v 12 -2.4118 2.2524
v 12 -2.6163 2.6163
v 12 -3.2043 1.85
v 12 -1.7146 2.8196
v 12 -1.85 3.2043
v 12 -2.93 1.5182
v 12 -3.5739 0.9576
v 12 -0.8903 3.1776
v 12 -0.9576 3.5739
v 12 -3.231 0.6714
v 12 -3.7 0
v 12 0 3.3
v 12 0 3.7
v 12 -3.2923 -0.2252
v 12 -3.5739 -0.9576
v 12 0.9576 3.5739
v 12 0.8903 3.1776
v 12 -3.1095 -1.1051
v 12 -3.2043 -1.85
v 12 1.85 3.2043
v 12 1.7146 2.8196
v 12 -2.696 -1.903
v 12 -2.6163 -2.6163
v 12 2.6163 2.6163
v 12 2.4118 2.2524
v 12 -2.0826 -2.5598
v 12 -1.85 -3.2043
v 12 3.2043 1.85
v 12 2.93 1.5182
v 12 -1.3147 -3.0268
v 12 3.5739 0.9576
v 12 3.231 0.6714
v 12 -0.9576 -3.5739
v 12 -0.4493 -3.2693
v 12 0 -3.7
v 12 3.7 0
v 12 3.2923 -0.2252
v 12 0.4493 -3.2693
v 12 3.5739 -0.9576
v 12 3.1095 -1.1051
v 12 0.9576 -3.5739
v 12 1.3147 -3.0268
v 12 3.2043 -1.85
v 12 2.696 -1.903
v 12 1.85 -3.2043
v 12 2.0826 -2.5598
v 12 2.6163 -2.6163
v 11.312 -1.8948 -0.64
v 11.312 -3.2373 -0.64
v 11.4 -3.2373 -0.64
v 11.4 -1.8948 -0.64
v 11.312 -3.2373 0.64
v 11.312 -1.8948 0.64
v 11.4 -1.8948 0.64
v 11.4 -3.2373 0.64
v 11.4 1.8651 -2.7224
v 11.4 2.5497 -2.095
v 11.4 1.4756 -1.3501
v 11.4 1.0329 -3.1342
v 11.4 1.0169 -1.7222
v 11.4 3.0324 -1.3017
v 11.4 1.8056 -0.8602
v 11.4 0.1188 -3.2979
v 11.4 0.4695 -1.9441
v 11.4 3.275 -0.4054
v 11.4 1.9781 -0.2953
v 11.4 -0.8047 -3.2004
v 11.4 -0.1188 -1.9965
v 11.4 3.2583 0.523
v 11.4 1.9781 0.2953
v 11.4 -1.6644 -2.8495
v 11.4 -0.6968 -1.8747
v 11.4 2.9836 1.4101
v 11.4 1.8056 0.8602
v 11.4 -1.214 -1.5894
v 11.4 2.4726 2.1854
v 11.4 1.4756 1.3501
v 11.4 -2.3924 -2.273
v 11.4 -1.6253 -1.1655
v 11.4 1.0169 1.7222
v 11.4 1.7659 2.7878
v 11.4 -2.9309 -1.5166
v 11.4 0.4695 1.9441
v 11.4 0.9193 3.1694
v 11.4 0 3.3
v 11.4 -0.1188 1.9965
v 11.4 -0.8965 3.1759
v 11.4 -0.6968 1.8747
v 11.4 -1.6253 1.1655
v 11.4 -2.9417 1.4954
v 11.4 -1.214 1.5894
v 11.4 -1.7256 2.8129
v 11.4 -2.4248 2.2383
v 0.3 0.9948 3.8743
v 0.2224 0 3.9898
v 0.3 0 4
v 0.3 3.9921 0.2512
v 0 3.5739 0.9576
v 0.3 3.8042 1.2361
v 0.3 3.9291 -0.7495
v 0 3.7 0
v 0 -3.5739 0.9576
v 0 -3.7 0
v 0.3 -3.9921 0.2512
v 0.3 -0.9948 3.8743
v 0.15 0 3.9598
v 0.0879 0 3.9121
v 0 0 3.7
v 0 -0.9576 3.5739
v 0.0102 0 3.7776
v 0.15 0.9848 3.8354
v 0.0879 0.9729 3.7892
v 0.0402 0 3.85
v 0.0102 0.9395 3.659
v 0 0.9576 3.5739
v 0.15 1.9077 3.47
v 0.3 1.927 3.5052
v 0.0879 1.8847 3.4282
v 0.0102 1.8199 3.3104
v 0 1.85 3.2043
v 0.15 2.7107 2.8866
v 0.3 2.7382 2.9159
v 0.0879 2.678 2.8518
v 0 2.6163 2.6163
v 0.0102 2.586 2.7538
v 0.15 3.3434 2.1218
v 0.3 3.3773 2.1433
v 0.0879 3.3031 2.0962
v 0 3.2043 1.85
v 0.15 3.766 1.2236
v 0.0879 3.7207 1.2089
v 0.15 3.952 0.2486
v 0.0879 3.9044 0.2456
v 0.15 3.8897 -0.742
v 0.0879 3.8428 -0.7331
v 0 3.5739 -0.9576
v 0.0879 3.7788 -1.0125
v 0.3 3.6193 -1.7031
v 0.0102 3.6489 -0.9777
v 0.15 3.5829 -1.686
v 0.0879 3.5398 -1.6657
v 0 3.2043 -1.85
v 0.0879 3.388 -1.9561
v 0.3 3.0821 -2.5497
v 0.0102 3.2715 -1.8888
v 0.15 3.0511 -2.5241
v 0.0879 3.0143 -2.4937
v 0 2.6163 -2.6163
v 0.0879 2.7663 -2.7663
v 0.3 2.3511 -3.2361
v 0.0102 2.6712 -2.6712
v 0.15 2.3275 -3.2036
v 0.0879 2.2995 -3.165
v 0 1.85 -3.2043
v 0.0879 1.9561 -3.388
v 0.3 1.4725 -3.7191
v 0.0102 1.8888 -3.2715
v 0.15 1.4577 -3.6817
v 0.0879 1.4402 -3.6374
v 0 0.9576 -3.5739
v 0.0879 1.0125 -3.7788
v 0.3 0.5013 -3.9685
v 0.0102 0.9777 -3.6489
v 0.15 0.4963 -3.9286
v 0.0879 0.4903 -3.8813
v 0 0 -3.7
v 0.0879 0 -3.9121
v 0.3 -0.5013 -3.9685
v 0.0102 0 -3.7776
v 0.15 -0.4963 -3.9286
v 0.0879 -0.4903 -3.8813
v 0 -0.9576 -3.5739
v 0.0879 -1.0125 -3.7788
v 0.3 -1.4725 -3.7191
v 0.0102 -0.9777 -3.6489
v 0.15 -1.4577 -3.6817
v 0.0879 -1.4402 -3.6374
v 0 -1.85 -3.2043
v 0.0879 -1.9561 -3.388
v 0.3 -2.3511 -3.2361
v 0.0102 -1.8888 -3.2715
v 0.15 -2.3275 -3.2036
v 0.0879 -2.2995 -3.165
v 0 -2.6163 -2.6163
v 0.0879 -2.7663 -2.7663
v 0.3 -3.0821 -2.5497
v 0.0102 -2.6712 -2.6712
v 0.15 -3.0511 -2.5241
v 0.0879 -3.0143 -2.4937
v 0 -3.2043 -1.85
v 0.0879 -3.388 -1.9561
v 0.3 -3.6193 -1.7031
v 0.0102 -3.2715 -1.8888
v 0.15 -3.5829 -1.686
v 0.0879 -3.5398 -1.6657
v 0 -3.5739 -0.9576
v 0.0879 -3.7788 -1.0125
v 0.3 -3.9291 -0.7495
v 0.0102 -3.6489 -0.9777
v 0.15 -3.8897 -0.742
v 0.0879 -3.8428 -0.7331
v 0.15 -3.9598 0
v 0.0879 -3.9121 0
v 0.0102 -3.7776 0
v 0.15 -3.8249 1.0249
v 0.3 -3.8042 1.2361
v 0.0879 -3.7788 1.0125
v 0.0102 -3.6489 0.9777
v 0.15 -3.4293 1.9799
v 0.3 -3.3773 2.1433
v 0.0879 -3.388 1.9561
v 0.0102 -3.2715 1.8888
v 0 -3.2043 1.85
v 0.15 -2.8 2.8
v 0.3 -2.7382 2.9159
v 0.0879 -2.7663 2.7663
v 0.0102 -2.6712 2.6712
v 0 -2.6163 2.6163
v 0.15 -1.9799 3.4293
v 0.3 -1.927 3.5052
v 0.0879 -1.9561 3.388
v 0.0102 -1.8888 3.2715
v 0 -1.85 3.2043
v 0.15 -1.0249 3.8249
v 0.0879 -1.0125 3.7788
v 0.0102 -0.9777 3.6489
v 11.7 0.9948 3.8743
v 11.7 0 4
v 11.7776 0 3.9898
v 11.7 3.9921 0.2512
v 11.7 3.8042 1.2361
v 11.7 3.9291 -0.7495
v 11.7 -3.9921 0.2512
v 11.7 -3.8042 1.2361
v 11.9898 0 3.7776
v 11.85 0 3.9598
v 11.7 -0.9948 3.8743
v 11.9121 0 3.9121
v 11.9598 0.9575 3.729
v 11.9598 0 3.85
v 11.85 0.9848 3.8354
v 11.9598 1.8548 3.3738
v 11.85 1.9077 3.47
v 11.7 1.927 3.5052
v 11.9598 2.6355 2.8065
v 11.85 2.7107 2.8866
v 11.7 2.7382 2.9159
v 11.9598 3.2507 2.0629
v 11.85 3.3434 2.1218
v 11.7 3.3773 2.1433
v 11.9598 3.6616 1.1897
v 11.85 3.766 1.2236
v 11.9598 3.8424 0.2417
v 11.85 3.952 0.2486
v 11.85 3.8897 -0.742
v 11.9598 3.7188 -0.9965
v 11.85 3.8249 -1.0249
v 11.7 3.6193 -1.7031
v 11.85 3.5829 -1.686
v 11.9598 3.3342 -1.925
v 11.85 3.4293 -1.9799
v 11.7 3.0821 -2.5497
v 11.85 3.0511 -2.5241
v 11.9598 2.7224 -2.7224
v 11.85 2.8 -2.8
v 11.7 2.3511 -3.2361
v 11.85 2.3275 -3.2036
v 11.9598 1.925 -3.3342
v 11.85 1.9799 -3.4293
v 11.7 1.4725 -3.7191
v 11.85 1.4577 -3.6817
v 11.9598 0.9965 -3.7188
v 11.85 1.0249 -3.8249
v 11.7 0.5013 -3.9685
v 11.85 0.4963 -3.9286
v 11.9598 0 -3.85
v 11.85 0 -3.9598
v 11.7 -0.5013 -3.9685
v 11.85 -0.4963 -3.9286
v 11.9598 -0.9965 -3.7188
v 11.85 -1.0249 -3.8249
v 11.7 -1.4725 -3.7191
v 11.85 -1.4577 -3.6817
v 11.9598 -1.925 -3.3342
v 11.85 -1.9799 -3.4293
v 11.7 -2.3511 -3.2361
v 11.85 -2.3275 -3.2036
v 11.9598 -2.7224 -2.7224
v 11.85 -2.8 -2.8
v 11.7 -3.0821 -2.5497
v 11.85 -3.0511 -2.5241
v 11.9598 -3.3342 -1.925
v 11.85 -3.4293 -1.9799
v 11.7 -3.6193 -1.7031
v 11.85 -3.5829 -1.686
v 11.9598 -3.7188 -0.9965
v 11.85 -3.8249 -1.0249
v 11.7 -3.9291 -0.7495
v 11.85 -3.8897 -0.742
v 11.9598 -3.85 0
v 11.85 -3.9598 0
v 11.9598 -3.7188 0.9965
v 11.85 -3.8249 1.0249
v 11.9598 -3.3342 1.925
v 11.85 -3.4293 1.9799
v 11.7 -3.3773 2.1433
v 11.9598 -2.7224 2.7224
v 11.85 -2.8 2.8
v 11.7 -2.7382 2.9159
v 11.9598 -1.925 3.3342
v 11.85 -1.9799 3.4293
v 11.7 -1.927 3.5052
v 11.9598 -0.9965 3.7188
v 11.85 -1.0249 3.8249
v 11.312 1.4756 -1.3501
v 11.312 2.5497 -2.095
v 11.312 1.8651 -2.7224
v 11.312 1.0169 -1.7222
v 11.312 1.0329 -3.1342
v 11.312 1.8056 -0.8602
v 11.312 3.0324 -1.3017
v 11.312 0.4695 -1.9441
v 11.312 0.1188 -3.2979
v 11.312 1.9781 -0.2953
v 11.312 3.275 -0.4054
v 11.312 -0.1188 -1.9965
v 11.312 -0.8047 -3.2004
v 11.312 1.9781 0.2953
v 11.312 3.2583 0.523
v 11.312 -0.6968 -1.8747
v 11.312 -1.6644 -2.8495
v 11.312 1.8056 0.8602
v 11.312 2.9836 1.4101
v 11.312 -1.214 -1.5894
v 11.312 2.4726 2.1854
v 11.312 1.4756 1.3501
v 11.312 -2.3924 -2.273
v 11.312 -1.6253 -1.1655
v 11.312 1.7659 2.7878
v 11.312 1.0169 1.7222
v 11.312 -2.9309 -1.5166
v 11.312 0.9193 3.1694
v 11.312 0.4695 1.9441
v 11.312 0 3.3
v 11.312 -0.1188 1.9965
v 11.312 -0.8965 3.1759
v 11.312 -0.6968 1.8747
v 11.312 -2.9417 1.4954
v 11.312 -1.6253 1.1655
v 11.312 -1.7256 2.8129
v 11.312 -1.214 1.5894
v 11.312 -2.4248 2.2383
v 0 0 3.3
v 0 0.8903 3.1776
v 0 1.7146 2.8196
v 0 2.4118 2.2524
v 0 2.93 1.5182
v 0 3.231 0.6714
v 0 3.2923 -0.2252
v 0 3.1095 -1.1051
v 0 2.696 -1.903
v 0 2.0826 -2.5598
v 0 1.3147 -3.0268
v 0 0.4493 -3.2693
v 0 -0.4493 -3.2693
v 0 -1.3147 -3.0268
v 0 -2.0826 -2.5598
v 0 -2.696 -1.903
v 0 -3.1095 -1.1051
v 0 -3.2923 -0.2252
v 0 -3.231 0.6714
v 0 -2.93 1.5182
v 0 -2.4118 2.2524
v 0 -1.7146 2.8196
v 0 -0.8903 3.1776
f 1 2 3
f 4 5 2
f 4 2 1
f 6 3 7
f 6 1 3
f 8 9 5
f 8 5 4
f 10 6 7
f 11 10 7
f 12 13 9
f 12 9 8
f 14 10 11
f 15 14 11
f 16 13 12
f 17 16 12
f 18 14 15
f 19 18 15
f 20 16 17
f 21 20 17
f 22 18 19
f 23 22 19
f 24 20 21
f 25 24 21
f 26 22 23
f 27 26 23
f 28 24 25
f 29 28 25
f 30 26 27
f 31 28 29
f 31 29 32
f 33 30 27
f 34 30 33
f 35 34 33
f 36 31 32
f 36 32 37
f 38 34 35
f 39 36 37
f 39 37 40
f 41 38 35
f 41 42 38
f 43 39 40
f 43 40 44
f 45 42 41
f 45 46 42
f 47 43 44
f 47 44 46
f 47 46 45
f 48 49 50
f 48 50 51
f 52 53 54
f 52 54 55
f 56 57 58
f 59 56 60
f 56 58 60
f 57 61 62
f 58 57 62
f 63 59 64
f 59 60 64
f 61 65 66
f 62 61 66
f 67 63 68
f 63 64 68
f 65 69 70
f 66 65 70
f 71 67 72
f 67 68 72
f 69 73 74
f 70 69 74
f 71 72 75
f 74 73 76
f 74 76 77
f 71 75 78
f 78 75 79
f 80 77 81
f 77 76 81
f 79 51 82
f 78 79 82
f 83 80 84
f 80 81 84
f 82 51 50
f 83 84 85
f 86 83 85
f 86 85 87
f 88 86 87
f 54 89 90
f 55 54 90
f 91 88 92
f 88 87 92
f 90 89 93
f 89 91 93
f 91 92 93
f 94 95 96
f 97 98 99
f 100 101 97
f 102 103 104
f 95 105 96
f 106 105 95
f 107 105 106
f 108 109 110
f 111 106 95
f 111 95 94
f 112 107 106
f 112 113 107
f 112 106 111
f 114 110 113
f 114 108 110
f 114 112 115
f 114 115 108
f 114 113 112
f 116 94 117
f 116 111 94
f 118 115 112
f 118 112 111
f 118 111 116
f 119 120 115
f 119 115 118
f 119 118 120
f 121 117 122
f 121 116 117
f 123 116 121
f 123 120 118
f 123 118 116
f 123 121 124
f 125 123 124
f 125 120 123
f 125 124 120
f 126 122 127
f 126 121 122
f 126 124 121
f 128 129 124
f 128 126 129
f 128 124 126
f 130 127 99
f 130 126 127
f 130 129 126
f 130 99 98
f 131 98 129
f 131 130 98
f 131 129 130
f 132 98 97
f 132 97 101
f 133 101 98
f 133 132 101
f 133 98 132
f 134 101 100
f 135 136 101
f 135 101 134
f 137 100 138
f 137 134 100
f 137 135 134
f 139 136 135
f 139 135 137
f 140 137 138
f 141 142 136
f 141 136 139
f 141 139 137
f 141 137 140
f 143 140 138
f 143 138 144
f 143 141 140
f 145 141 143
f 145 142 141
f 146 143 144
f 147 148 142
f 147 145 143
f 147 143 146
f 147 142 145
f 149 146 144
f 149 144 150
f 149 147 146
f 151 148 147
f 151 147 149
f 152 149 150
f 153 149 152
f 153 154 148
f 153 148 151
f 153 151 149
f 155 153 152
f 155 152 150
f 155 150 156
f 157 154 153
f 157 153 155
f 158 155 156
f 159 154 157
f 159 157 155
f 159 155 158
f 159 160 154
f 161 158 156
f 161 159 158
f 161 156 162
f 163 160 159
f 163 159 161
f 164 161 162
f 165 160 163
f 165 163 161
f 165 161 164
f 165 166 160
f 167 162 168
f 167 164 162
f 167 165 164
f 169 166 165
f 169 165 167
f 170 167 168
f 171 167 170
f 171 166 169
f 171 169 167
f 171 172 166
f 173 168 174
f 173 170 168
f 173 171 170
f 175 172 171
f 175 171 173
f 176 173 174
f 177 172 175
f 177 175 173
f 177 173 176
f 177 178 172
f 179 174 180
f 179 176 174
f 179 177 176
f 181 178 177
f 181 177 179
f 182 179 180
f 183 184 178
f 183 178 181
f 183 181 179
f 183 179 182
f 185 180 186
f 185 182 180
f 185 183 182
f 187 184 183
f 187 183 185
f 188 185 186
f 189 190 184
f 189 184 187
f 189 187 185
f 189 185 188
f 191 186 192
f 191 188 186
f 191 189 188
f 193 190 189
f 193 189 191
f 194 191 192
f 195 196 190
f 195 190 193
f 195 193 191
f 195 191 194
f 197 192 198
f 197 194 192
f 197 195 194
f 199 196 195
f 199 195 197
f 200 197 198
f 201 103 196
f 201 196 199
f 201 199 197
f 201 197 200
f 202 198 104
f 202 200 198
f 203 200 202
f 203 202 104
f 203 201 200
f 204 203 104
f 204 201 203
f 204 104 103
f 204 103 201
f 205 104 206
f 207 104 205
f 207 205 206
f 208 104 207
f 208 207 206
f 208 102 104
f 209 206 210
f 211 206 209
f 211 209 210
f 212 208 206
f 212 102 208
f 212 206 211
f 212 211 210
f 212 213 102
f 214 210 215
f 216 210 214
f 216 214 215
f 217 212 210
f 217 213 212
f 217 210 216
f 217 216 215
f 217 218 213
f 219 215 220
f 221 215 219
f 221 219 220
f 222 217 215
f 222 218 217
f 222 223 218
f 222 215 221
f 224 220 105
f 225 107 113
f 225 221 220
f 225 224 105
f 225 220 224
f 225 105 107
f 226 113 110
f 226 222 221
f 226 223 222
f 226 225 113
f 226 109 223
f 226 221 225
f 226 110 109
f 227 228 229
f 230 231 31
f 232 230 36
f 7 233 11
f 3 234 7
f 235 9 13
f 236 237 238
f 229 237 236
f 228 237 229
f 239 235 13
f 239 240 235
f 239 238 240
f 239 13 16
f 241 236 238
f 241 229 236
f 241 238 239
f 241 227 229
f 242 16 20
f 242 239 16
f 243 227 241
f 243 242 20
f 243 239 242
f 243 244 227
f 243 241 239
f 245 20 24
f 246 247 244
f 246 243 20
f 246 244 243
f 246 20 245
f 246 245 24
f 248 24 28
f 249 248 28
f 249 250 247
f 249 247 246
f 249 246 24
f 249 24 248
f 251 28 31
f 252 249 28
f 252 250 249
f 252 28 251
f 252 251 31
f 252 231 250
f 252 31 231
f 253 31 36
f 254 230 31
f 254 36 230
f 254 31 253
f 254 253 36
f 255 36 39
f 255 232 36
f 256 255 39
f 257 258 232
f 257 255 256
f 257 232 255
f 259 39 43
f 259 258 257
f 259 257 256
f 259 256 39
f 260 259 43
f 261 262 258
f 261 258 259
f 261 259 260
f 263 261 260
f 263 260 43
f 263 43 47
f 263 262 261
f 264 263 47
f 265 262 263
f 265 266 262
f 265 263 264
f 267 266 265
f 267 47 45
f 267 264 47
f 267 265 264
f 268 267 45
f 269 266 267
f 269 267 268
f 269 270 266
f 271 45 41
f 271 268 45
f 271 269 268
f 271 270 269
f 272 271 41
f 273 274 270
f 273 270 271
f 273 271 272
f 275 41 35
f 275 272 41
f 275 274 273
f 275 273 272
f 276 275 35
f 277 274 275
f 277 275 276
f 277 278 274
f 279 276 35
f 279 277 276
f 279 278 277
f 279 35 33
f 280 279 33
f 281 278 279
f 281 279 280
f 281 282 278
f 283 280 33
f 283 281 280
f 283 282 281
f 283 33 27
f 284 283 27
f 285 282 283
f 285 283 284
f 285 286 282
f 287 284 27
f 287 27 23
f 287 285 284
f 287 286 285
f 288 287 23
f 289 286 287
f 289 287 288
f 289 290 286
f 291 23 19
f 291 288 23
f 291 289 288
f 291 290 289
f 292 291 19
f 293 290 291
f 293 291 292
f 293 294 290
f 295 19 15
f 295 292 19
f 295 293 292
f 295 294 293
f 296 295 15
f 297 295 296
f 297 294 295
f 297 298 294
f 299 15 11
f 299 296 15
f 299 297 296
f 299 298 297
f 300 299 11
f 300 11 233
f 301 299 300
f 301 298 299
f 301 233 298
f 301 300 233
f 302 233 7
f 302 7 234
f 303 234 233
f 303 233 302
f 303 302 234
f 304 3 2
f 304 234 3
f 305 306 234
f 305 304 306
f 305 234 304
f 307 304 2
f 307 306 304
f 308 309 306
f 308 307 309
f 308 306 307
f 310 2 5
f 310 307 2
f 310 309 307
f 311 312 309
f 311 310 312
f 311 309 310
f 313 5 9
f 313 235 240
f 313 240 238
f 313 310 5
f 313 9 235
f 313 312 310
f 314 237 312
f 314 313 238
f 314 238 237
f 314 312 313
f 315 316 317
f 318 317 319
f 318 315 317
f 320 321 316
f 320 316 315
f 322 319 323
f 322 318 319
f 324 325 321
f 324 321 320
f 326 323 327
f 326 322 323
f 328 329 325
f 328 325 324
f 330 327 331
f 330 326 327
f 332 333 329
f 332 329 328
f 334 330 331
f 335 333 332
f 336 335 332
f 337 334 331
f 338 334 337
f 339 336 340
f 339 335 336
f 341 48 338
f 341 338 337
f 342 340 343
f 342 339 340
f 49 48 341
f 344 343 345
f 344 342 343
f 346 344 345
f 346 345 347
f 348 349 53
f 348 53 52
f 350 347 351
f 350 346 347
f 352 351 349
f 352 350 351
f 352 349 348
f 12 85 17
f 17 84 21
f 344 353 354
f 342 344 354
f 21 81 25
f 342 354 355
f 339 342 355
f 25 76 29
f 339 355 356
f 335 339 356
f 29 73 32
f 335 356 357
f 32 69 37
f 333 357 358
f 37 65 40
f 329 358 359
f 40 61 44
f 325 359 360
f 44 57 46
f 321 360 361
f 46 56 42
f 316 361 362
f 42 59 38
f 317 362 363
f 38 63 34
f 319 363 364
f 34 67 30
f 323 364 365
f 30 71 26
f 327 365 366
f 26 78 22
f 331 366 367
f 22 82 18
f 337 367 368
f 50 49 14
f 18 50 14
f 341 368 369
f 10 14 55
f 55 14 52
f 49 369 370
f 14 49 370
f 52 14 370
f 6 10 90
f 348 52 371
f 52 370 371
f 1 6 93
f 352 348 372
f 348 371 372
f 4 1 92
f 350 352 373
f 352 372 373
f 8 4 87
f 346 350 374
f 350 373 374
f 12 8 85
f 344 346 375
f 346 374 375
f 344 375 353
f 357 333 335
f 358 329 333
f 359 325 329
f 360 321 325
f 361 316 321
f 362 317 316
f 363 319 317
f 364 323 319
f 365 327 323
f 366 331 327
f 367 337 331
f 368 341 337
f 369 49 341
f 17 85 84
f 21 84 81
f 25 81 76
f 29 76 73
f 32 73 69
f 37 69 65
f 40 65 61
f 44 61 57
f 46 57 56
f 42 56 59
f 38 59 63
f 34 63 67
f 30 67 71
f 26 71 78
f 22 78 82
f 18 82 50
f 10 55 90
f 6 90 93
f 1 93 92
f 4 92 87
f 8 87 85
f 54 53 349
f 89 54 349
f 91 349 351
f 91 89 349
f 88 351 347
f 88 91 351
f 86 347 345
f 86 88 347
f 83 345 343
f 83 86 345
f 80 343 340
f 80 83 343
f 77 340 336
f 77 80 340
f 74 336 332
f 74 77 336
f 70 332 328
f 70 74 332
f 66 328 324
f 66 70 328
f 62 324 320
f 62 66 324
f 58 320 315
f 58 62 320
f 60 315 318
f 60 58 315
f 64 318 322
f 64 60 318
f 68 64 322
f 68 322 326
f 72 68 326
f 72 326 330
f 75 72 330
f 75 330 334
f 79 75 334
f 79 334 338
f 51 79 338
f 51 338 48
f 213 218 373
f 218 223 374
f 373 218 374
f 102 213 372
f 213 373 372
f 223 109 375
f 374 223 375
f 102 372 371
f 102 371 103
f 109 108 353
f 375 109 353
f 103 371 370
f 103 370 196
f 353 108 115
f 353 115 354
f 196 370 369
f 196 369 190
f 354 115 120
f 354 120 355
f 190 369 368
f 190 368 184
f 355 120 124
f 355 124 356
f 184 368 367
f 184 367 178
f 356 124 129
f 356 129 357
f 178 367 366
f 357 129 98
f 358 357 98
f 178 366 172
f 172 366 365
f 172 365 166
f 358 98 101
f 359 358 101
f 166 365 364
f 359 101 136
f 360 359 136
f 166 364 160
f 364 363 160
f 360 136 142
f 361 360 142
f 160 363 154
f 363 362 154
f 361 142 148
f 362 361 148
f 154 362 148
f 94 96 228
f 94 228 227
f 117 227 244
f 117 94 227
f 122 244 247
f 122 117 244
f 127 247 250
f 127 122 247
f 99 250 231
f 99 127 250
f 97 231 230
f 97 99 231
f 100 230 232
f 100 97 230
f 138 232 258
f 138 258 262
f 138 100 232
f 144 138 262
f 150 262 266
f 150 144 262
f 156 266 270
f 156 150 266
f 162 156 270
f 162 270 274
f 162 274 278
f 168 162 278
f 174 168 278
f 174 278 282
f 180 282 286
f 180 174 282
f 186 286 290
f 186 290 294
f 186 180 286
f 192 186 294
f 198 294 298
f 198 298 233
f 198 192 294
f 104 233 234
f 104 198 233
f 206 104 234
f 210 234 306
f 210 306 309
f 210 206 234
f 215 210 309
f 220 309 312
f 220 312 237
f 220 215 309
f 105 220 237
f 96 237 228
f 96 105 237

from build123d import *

# Parameters (mm, degrees)
SKETCH1_W                  = 12
SKETCH1_H                  = 4
F_6_6_6_6_DIAMETER_HOLE1_D = 6.6
BOSS_EXTRUDE1_DEPTH        = 0.088
FILLET1_R                  = 0.3


with BuildPart() as part:
    # Sketch1 → Revolve1 (revolve)
    with BuildSketch(Plane(origin=(0, 0, 0), x_dir=(-1, 0, 0), z_dir=(0, 0, -1)), mode=Mode.PRIVATE) as revolve1_sk:
        with Locations((-6, 2)):
            Rectangle(SKETCH1_W, SKETCH1_H)
    revolve(revolve1_sk.sketch.rotate(Axis((12, 0, 0), (-1, 0, 0)), 270), axis=Axis((12, 0, 0), (-1, 0, 0)))

    # Ø6.6 (6.6) Diameter Hole1 (through all)
    with Locations(Plane(origin=(12, 0, 0), x_dir=(0, 0, -1), z_dir=(1, 0, 0))):
        with Locations((0, 0)):
            Hole(F_6_6_6_6_DIAMETER_HOLE1_D / 2)

    # Sketch4 → Boss-Extrude1 (add)
    with BuildSketch(Plane(origin=(11.312, 0, 0), x_dir=(0, -1, 0), z_dir=(-1, 0, 0))):
        with BuildLine():
            Line((1.894835085, 0.64), (3.237344591, 0.64))
            ThreePointArc((3.237344591, 0.64), (-3.3, 0), (3.237344591, -0.64))
            Line((3.237344591, -0.64), (1.894835085, -0.64))
            ThreePointArc((1.894835085, -0.64), (2, 0), (1.894835085, 0.64))
        make_face()
    extrude(amount=-BOSS_EXTRUDE1_DEPTH)

    # Sketch5 → Cut-Revolve1 (revolve, cut)
    with BuildSketch(Plane(origin=(0, 0, 0), x_dir=(-1, 0, 0), z_dir=(0, 0, -1)), mode=Mode.PRIVATE) as cut_revolve1_sk:
        Polygon((-11.4, 2), (-11.4, 0), (0, 0), (0, 3.3), (-0.6, 3.3), (-0.6, 2), align=None)
    revolve(cut_revolve1_sk.sketch.rotate(Axis((11.4, 0, 0), (-1, 0, 0)), 90), axis=Axis((11.4, 0, 0), (-1, 0, 0)), mode=Mode.SUBTRACT)

    # Fillet1
    fillet1_edges = [part.edges().sort_by_distance(p)[0] for p in [
        (0, 0, -4),
        (12, 0, -4),
    ]]
    fillet(fillet1_edges, radius=FILLET1_R)


solid = part.part
